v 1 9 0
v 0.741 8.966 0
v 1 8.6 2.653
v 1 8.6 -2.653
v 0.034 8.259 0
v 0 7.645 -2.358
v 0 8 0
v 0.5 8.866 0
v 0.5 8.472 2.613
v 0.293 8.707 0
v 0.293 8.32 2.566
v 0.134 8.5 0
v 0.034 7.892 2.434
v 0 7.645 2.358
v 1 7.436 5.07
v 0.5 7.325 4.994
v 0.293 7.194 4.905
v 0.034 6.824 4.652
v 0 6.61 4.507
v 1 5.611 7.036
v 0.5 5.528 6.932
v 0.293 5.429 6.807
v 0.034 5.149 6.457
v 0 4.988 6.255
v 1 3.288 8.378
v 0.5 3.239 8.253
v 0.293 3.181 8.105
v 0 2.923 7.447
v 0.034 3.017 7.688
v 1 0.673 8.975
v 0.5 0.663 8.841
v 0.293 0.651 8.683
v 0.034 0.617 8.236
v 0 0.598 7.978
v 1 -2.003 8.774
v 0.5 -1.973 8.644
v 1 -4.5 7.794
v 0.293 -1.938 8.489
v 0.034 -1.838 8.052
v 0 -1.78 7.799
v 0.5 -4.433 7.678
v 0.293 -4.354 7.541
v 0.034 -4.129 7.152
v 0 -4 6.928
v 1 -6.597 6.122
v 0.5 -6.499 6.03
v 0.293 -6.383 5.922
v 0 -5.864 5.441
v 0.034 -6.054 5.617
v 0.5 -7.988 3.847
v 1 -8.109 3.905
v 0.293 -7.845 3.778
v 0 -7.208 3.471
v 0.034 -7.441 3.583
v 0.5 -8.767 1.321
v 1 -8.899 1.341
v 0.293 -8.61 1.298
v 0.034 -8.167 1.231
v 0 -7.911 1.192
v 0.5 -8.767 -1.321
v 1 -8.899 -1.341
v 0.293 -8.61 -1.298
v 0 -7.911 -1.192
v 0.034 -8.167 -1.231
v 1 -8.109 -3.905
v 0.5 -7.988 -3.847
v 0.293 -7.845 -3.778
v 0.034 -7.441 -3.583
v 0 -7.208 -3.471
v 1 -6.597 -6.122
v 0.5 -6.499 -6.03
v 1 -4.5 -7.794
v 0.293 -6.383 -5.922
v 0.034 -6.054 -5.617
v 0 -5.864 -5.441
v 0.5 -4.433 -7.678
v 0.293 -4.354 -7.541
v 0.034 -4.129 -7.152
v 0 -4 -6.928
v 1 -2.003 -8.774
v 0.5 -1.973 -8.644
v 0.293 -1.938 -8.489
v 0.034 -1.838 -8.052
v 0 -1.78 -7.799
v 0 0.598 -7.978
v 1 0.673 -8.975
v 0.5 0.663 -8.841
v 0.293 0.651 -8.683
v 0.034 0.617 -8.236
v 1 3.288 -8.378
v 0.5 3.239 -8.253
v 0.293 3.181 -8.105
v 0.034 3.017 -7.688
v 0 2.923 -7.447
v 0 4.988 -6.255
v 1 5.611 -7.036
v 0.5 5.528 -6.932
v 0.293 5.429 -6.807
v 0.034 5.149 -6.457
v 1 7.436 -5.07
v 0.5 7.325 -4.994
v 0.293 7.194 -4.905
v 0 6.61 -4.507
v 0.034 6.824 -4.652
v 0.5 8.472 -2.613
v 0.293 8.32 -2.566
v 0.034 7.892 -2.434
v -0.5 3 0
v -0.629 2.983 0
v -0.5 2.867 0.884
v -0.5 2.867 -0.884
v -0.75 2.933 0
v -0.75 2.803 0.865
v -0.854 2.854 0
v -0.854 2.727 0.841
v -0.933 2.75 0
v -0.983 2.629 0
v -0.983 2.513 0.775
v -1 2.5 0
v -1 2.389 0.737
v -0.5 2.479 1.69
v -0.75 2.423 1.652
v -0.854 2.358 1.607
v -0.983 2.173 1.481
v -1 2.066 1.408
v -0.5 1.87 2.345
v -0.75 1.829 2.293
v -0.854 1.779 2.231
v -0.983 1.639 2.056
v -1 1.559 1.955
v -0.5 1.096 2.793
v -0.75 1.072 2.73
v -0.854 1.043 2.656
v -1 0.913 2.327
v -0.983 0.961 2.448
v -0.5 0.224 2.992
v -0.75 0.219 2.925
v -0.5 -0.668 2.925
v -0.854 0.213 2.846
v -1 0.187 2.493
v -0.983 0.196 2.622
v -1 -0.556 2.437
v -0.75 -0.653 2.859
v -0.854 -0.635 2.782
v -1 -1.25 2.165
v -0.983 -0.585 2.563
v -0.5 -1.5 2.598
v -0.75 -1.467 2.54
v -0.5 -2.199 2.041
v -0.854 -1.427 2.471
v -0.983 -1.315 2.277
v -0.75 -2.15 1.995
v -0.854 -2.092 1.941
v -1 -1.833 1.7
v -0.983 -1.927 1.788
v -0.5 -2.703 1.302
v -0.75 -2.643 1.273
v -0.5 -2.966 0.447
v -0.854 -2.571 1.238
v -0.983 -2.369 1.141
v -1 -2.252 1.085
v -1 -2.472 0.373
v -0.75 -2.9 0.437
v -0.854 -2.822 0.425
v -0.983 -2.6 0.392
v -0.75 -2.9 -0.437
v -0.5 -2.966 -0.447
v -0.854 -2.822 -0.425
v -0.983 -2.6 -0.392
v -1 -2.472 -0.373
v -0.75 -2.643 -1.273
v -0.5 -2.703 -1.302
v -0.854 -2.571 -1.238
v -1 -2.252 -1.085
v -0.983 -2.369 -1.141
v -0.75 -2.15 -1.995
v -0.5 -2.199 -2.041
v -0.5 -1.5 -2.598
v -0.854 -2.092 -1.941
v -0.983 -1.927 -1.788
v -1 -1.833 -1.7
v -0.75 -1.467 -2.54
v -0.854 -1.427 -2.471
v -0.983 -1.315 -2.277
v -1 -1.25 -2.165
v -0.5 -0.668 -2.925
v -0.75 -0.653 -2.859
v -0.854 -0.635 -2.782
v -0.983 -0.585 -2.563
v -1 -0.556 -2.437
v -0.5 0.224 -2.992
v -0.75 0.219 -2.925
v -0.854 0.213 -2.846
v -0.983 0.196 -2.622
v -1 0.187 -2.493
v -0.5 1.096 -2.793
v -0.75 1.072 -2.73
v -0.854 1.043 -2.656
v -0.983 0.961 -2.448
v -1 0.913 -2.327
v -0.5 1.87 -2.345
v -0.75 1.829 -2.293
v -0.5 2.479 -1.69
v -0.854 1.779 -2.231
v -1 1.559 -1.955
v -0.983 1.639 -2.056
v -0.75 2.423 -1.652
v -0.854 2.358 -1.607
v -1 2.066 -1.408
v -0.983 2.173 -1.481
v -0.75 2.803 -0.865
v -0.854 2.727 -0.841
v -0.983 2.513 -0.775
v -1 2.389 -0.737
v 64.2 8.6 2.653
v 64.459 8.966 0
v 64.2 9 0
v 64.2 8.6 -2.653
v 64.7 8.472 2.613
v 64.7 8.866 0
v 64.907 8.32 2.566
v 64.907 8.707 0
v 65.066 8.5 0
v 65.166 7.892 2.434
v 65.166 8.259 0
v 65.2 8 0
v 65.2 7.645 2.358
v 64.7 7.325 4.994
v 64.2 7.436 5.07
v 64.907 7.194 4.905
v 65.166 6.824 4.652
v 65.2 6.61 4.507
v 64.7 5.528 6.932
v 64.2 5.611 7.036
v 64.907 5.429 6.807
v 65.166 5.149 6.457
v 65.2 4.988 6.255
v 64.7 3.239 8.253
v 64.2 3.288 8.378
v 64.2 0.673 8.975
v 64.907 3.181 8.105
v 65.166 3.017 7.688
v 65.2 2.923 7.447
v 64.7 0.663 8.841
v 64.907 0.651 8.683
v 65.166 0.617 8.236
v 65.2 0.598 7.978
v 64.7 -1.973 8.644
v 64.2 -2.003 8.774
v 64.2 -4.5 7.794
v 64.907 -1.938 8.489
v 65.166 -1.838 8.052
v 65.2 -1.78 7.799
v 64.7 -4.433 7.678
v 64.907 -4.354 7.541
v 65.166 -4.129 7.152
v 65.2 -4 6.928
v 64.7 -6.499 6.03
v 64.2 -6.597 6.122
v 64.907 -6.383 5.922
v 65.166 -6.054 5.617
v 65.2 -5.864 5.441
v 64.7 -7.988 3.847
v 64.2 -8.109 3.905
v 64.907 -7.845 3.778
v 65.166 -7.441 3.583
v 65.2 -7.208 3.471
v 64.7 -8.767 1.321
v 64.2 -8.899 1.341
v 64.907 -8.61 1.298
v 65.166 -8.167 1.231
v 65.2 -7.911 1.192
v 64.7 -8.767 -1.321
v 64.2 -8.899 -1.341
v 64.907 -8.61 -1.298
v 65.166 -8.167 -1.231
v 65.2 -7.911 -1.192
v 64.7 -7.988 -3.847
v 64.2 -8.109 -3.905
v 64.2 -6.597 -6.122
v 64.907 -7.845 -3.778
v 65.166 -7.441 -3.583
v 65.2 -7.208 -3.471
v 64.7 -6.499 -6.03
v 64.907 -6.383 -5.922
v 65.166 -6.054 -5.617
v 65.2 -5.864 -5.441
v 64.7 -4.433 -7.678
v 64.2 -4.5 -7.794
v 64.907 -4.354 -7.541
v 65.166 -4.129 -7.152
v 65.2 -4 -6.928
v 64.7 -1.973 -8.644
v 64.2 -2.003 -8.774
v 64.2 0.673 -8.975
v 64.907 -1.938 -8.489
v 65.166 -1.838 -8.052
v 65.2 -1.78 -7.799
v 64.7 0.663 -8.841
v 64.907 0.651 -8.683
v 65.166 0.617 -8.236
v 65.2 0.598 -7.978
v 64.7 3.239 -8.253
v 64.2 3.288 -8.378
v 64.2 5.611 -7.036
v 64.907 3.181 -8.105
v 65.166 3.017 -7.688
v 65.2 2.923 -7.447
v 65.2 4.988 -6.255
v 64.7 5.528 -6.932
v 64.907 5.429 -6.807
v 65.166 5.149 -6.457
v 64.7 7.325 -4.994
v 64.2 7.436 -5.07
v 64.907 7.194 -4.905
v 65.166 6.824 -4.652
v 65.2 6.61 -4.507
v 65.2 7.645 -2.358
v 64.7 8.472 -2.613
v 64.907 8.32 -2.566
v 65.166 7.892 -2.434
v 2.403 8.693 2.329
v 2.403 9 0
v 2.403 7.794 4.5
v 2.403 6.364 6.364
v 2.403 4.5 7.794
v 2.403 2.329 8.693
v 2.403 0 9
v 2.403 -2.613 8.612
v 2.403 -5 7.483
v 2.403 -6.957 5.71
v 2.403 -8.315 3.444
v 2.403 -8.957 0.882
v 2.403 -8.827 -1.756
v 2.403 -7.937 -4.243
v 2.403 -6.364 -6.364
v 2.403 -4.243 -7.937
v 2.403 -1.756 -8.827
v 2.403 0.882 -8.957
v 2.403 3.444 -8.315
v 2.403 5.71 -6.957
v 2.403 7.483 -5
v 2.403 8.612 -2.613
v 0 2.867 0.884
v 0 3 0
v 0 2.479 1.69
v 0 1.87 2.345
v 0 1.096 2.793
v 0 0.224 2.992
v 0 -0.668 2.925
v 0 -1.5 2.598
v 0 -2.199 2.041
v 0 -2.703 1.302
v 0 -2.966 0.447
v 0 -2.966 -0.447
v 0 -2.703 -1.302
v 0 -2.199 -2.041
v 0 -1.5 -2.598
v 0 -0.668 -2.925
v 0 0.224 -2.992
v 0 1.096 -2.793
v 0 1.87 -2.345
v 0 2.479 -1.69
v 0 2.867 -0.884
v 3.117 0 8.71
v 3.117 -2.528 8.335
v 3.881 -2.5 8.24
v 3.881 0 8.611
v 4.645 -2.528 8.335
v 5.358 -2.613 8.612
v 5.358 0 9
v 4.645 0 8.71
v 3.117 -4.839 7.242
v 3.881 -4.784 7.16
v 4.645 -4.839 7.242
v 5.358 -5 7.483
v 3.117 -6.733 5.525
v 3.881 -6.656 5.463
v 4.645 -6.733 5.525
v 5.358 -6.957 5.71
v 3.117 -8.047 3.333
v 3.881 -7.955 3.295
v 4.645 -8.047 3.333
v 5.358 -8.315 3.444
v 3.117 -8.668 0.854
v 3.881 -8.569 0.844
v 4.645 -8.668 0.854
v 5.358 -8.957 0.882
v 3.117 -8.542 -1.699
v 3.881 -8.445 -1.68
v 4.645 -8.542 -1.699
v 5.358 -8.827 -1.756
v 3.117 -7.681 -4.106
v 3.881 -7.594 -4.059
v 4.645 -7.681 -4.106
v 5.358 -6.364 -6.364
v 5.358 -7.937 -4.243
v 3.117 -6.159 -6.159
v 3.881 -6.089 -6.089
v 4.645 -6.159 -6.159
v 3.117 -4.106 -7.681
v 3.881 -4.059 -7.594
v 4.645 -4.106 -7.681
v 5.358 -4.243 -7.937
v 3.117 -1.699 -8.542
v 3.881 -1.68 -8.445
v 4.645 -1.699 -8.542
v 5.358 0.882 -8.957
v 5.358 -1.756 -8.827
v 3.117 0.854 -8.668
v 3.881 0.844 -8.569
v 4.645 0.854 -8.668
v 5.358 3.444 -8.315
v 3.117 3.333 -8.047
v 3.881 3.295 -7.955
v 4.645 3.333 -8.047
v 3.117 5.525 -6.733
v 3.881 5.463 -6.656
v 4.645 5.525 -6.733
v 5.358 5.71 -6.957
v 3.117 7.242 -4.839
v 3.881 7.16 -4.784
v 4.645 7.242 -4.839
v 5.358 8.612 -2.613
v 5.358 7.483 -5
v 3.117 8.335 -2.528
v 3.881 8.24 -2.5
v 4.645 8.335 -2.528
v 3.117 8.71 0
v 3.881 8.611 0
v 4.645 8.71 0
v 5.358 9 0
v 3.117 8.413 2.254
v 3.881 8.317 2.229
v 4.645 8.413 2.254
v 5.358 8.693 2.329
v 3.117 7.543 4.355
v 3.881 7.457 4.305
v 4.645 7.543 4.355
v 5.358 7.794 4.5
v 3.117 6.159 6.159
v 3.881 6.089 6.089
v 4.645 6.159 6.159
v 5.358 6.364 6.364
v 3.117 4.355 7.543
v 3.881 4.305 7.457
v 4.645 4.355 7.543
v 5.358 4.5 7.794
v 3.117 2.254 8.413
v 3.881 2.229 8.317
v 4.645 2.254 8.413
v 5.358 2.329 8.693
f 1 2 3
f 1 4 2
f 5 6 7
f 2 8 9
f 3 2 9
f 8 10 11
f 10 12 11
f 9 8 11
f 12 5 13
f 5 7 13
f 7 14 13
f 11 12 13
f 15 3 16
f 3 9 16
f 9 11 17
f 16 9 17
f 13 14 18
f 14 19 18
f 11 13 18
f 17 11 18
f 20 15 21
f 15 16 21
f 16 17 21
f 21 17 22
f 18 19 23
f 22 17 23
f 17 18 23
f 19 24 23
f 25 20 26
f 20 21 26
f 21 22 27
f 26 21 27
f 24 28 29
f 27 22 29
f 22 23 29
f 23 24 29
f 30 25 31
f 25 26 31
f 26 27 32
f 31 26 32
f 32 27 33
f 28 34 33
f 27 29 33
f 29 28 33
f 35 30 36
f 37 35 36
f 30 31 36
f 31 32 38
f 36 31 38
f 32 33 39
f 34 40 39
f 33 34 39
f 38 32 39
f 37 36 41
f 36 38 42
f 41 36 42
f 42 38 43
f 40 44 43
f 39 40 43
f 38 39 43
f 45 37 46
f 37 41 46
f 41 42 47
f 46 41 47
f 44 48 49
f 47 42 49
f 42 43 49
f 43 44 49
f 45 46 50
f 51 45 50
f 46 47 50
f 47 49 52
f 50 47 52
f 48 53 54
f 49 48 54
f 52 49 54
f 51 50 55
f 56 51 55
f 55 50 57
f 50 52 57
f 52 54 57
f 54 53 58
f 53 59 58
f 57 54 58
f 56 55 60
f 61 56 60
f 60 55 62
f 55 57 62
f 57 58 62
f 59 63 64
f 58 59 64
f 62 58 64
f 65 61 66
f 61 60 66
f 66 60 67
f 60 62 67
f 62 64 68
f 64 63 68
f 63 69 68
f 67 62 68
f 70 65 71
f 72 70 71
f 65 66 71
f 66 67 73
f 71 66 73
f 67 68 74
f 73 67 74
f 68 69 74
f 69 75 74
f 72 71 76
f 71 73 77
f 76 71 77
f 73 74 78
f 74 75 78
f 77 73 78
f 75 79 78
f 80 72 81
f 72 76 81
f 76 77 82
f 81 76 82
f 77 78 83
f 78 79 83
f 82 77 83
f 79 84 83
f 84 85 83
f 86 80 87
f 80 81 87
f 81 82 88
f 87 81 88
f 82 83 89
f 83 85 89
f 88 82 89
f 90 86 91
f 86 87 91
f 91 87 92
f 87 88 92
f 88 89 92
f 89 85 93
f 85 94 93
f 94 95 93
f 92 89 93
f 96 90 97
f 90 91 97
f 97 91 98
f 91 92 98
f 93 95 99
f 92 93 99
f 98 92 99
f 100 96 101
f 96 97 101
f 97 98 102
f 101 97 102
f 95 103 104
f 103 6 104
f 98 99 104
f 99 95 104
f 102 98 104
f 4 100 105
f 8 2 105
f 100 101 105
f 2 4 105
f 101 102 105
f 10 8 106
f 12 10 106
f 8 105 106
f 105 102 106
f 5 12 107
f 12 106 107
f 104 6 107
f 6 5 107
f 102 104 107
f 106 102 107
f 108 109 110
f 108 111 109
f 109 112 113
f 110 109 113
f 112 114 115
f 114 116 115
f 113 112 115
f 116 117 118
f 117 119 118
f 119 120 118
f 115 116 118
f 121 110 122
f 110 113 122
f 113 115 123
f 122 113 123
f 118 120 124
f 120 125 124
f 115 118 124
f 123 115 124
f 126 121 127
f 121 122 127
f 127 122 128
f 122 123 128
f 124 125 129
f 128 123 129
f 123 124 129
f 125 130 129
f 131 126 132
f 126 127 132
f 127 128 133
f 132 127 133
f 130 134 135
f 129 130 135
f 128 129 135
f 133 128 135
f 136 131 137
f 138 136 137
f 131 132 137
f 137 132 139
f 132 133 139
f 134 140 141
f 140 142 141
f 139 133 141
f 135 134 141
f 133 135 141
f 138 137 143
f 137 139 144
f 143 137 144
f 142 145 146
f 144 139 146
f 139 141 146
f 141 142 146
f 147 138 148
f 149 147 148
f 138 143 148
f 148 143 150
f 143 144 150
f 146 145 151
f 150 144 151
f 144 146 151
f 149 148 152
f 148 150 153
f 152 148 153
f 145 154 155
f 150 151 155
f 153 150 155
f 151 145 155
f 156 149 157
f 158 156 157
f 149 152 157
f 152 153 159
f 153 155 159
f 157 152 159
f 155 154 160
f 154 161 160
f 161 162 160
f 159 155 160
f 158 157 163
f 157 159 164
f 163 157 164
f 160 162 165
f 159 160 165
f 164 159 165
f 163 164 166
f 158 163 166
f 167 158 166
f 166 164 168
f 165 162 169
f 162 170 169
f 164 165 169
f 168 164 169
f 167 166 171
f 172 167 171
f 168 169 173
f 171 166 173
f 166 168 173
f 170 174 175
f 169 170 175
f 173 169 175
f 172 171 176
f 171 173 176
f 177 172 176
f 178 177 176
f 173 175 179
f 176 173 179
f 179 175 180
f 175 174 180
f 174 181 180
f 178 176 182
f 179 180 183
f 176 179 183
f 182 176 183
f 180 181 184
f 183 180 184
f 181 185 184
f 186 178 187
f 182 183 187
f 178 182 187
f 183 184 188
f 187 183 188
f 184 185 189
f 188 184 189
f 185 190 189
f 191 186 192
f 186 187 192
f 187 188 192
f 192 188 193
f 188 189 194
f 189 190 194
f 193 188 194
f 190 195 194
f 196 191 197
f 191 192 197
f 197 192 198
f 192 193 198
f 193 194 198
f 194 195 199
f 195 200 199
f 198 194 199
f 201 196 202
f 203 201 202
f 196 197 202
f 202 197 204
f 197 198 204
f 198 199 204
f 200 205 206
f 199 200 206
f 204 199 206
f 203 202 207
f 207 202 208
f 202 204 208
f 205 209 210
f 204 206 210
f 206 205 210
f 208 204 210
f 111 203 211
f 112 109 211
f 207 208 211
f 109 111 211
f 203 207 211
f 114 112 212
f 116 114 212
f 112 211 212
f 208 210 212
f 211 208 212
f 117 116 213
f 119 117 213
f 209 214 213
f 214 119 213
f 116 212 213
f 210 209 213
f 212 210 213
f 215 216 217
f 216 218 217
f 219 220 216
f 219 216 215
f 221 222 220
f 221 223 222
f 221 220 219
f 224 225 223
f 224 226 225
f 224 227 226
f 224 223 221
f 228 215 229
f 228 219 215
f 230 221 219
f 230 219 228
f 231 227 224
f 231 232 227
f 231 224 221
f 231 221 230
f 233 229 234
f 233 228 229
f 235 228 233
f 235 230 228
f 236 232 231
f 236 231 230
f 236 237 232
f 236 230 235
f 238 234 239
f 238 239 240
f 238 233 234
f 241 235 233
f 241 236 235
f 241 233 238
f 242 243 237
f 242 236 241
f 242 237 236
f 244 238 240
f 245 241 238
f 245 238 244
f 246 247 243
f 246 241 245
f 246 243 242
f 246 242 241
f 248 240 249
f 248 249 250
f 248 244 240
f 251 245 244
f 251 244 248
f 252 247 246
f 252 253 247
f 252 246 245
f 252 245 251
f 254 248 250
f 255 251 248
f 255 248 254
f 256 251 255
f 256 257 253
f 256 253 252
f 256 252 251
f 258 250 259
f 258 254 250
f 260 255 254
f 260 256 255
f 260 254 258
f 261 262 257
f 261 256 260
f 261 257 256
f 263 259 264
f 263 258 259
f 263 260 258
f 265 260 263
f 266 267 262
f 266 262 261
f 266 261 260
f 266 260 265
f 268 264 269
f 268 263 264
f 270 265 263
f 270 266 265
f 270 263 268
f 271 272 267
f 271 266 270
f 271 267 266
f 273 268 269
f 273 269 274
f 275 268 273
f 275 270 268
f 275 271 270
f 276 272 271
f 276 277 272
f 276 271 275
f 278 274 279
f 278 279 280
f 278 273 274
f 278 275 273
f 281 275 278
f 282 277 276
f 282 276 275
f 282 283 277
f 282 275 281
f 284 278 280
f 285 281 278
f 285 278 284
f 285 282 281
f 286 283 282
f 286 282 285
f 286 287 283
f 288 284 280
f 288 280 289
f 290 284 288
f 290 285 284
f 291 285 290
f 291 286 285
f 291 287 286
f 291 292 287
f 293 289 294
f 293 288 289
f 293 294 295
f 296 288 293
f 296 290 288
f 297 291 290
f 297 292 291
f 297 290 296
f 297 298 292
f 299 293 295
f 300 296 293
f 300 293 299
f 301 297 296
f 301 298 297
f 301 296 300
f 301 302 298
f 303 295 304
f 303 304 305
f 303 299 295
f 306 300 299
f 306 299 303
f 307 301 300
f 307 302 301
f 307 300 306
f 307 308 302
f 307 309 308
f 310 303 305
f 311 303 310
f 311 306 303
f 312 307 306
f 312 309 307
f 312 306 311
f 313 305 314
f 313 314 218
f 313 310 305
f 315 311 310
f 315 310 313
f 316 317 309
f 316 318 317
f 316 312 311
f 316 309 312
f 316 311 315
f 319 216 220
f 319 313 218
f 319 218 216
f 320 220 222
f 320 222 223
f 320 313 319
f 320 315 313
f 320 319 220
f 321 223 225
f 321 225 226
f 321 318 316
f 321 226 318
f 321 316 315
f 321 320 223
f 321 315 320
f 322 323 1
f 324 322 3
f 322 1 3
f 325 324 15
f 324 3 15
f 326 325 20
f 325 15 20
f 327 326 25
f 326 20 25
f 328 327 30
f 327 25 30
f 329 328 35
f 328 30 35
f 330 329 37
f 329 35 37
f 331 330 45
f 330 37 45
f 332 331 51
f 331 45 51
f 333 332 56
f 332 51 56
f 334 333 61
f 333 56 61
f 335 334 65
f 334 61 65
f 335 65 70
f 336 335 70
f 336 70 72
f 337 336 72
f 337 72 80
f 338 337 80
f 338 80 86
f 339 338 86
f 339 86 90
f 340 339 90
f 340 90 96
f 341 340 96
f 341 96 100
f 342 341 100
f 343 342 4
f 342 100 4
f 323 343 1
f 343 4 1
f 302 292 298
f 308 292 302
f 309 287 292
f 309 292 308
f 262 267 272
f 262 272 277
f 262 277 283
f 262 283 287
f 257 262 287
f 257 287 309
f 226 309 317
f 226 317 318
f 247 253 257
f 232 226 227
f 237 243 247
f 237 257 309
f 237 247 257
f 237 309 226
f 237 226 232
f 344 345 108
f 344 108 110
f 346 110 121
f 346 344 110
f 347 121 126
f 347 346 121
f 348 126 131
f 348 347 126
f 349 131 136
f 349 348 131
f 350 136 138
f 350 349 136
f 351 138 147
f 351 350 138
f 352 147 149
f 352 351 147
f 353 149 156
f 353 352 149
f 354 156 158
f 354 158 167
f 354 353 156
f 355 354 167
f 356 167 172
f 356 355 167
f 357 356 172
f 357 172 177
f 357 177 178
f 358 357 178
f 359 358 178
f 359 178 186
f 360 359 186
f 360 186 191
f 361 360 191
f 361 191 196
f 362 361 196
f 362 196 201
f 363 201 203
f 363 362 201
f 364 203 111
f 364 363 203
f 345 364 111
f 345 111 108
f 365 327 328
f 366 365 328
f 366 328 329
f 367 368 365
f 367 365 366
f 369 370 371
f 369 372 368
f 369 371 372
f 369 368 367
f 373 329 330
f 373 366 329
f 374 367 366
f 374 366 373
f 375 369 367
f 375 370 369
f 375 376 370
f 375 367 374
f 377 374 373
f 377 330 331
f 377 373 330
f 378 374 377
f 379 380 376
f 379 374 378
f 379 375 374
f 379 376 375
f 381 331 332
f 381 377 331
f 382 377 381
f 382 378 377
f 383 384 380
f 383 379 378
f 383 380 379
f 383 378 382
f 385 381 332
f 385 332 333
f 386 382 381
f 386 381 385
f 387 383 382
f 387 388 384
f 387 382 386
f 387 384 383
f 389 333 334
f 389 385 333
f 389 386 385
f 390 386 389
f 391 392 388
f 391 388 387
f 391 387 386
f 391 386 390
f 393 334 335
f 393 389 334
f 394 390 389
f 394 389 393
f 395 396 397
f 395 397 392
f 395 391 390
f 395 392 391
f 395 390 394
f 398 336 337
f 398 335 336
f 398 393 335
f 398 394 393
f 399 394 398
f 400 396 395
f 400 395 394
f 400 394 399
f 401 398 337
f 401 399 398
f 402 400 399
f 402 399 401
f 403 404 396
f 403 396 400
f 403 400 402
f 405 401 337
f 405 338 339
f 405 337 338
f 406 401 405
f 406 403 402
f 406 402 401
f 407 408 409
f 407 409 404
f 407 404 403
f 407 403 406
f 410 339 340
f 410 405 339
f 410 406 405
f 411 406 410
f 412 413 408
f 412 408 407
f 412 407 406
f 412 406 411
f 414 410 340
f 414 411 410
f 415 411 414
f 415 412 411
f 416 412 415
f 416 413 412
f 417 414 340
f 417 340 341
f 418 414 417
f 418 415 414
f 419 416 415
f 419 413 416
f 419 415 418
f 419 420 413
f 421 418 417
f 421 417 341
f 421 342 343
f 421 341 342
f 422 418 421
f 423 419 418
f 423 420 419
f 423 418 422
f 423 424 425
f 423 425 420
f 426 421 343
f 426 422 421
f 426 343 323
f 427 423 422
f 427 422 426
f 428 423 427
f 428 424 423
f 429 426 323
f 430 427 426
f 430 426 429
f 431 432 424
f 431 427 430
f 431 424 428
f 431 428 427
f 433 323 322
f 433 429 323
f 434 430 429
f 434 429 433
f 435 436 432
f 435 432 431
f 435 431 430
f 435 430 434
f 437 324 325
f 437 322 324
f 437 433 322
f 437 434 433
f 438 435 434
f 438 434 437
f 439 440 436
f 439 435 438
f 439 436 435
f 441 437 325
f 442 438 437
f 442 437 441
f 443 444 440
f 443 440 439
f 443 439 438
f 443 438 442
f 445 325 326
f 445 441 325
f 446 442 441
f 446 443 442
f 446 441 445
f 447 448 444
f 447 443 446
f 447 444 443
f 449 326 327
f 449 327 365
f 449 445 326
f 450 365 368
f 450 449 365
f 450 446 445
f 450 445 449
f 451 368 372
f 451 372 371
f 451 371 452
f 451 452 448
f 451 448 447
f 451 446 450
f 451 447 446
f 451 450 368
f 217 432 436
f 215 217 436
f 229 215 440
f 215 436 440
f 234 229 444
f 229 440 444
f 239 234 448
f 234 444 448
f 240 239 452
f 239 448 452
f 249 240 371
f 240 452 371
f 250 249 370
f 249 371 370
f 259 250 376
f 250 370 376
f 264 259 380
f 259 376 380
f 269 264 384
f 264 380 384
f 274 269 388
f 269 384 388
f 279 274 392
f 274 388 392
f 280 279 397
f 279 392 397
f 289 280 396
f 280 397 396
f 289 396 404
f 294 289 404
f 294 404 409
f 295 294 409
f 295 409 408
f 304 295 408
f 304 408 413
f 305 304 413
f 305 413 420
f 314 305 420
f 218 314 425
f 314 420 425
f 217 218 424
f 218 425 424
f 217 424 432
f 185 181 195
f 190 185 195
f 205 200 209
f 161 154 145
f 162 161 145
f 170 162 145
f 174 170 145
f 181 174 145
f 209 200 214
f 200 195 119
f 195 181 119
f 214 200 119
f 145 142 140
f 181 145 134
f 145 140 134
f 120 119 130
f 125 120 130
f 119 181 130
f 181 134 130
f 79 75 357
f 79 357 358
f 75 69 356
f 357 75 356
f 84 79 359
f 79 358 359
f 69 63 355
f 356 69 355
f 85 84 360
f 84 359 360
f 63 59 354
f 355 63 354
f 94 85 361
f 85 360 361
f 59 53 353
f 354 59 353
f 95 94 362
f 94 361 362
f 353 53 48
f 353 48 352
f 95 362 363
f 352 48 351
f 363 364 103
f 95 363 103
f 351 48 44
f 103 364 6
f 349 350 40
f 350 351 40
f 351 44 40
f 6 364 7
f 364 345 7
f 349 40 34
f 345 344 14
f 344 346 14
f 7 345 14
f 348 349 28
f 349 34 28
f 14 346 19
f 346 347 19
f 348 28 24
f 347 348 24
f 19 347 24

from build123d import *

# Parameters (mm, degrees)
F0_R     = 9
F1_DEPTH = 65.2
F2_R     = 1
F3_R     = 3
F4_DEPTH = 1
F5_R     = 0.5
F6_R     = 3


with BuildPart() as f1:
    # F0 (on Right) → F1 (new body)
    with BuildSketch(Plane.YZ):
        Circle(F0_R)
    extrude(amount=F1_DEPTH)

    # F2
    f2_edges = [f1.edges().sort_by_distance(p)[0] for p in [
        (65.2, -9, 0),
        (0, -9, 0),
    ]]
    fillet(f2_edges, radius=F2_R)

    # F3 (on Right) → F4 (join)
    with BuildSketch(Plane.YZ):
        Circle(F3_R)
    extrude(amount=-F4_DEPTH)

    # F5
    f5_edges = [f1.edges().sort_by_distance(p)[0] for p in [
        (-1, -3, 0),
    ]]
    fillet(f5_edges, radius=F5_R)

    # F6 (on Front) → F7 (revolve, cut)
    with BuildSketch(Plane.XZ):
        with Locations((3.8806945086, 11.6108693182)):
            Circle(F6_R)
    revolve(axis=Axis((1, 0, 0), (1, 0, 0)), mode=Mode.SUBTRACT)


solid = f1.part
